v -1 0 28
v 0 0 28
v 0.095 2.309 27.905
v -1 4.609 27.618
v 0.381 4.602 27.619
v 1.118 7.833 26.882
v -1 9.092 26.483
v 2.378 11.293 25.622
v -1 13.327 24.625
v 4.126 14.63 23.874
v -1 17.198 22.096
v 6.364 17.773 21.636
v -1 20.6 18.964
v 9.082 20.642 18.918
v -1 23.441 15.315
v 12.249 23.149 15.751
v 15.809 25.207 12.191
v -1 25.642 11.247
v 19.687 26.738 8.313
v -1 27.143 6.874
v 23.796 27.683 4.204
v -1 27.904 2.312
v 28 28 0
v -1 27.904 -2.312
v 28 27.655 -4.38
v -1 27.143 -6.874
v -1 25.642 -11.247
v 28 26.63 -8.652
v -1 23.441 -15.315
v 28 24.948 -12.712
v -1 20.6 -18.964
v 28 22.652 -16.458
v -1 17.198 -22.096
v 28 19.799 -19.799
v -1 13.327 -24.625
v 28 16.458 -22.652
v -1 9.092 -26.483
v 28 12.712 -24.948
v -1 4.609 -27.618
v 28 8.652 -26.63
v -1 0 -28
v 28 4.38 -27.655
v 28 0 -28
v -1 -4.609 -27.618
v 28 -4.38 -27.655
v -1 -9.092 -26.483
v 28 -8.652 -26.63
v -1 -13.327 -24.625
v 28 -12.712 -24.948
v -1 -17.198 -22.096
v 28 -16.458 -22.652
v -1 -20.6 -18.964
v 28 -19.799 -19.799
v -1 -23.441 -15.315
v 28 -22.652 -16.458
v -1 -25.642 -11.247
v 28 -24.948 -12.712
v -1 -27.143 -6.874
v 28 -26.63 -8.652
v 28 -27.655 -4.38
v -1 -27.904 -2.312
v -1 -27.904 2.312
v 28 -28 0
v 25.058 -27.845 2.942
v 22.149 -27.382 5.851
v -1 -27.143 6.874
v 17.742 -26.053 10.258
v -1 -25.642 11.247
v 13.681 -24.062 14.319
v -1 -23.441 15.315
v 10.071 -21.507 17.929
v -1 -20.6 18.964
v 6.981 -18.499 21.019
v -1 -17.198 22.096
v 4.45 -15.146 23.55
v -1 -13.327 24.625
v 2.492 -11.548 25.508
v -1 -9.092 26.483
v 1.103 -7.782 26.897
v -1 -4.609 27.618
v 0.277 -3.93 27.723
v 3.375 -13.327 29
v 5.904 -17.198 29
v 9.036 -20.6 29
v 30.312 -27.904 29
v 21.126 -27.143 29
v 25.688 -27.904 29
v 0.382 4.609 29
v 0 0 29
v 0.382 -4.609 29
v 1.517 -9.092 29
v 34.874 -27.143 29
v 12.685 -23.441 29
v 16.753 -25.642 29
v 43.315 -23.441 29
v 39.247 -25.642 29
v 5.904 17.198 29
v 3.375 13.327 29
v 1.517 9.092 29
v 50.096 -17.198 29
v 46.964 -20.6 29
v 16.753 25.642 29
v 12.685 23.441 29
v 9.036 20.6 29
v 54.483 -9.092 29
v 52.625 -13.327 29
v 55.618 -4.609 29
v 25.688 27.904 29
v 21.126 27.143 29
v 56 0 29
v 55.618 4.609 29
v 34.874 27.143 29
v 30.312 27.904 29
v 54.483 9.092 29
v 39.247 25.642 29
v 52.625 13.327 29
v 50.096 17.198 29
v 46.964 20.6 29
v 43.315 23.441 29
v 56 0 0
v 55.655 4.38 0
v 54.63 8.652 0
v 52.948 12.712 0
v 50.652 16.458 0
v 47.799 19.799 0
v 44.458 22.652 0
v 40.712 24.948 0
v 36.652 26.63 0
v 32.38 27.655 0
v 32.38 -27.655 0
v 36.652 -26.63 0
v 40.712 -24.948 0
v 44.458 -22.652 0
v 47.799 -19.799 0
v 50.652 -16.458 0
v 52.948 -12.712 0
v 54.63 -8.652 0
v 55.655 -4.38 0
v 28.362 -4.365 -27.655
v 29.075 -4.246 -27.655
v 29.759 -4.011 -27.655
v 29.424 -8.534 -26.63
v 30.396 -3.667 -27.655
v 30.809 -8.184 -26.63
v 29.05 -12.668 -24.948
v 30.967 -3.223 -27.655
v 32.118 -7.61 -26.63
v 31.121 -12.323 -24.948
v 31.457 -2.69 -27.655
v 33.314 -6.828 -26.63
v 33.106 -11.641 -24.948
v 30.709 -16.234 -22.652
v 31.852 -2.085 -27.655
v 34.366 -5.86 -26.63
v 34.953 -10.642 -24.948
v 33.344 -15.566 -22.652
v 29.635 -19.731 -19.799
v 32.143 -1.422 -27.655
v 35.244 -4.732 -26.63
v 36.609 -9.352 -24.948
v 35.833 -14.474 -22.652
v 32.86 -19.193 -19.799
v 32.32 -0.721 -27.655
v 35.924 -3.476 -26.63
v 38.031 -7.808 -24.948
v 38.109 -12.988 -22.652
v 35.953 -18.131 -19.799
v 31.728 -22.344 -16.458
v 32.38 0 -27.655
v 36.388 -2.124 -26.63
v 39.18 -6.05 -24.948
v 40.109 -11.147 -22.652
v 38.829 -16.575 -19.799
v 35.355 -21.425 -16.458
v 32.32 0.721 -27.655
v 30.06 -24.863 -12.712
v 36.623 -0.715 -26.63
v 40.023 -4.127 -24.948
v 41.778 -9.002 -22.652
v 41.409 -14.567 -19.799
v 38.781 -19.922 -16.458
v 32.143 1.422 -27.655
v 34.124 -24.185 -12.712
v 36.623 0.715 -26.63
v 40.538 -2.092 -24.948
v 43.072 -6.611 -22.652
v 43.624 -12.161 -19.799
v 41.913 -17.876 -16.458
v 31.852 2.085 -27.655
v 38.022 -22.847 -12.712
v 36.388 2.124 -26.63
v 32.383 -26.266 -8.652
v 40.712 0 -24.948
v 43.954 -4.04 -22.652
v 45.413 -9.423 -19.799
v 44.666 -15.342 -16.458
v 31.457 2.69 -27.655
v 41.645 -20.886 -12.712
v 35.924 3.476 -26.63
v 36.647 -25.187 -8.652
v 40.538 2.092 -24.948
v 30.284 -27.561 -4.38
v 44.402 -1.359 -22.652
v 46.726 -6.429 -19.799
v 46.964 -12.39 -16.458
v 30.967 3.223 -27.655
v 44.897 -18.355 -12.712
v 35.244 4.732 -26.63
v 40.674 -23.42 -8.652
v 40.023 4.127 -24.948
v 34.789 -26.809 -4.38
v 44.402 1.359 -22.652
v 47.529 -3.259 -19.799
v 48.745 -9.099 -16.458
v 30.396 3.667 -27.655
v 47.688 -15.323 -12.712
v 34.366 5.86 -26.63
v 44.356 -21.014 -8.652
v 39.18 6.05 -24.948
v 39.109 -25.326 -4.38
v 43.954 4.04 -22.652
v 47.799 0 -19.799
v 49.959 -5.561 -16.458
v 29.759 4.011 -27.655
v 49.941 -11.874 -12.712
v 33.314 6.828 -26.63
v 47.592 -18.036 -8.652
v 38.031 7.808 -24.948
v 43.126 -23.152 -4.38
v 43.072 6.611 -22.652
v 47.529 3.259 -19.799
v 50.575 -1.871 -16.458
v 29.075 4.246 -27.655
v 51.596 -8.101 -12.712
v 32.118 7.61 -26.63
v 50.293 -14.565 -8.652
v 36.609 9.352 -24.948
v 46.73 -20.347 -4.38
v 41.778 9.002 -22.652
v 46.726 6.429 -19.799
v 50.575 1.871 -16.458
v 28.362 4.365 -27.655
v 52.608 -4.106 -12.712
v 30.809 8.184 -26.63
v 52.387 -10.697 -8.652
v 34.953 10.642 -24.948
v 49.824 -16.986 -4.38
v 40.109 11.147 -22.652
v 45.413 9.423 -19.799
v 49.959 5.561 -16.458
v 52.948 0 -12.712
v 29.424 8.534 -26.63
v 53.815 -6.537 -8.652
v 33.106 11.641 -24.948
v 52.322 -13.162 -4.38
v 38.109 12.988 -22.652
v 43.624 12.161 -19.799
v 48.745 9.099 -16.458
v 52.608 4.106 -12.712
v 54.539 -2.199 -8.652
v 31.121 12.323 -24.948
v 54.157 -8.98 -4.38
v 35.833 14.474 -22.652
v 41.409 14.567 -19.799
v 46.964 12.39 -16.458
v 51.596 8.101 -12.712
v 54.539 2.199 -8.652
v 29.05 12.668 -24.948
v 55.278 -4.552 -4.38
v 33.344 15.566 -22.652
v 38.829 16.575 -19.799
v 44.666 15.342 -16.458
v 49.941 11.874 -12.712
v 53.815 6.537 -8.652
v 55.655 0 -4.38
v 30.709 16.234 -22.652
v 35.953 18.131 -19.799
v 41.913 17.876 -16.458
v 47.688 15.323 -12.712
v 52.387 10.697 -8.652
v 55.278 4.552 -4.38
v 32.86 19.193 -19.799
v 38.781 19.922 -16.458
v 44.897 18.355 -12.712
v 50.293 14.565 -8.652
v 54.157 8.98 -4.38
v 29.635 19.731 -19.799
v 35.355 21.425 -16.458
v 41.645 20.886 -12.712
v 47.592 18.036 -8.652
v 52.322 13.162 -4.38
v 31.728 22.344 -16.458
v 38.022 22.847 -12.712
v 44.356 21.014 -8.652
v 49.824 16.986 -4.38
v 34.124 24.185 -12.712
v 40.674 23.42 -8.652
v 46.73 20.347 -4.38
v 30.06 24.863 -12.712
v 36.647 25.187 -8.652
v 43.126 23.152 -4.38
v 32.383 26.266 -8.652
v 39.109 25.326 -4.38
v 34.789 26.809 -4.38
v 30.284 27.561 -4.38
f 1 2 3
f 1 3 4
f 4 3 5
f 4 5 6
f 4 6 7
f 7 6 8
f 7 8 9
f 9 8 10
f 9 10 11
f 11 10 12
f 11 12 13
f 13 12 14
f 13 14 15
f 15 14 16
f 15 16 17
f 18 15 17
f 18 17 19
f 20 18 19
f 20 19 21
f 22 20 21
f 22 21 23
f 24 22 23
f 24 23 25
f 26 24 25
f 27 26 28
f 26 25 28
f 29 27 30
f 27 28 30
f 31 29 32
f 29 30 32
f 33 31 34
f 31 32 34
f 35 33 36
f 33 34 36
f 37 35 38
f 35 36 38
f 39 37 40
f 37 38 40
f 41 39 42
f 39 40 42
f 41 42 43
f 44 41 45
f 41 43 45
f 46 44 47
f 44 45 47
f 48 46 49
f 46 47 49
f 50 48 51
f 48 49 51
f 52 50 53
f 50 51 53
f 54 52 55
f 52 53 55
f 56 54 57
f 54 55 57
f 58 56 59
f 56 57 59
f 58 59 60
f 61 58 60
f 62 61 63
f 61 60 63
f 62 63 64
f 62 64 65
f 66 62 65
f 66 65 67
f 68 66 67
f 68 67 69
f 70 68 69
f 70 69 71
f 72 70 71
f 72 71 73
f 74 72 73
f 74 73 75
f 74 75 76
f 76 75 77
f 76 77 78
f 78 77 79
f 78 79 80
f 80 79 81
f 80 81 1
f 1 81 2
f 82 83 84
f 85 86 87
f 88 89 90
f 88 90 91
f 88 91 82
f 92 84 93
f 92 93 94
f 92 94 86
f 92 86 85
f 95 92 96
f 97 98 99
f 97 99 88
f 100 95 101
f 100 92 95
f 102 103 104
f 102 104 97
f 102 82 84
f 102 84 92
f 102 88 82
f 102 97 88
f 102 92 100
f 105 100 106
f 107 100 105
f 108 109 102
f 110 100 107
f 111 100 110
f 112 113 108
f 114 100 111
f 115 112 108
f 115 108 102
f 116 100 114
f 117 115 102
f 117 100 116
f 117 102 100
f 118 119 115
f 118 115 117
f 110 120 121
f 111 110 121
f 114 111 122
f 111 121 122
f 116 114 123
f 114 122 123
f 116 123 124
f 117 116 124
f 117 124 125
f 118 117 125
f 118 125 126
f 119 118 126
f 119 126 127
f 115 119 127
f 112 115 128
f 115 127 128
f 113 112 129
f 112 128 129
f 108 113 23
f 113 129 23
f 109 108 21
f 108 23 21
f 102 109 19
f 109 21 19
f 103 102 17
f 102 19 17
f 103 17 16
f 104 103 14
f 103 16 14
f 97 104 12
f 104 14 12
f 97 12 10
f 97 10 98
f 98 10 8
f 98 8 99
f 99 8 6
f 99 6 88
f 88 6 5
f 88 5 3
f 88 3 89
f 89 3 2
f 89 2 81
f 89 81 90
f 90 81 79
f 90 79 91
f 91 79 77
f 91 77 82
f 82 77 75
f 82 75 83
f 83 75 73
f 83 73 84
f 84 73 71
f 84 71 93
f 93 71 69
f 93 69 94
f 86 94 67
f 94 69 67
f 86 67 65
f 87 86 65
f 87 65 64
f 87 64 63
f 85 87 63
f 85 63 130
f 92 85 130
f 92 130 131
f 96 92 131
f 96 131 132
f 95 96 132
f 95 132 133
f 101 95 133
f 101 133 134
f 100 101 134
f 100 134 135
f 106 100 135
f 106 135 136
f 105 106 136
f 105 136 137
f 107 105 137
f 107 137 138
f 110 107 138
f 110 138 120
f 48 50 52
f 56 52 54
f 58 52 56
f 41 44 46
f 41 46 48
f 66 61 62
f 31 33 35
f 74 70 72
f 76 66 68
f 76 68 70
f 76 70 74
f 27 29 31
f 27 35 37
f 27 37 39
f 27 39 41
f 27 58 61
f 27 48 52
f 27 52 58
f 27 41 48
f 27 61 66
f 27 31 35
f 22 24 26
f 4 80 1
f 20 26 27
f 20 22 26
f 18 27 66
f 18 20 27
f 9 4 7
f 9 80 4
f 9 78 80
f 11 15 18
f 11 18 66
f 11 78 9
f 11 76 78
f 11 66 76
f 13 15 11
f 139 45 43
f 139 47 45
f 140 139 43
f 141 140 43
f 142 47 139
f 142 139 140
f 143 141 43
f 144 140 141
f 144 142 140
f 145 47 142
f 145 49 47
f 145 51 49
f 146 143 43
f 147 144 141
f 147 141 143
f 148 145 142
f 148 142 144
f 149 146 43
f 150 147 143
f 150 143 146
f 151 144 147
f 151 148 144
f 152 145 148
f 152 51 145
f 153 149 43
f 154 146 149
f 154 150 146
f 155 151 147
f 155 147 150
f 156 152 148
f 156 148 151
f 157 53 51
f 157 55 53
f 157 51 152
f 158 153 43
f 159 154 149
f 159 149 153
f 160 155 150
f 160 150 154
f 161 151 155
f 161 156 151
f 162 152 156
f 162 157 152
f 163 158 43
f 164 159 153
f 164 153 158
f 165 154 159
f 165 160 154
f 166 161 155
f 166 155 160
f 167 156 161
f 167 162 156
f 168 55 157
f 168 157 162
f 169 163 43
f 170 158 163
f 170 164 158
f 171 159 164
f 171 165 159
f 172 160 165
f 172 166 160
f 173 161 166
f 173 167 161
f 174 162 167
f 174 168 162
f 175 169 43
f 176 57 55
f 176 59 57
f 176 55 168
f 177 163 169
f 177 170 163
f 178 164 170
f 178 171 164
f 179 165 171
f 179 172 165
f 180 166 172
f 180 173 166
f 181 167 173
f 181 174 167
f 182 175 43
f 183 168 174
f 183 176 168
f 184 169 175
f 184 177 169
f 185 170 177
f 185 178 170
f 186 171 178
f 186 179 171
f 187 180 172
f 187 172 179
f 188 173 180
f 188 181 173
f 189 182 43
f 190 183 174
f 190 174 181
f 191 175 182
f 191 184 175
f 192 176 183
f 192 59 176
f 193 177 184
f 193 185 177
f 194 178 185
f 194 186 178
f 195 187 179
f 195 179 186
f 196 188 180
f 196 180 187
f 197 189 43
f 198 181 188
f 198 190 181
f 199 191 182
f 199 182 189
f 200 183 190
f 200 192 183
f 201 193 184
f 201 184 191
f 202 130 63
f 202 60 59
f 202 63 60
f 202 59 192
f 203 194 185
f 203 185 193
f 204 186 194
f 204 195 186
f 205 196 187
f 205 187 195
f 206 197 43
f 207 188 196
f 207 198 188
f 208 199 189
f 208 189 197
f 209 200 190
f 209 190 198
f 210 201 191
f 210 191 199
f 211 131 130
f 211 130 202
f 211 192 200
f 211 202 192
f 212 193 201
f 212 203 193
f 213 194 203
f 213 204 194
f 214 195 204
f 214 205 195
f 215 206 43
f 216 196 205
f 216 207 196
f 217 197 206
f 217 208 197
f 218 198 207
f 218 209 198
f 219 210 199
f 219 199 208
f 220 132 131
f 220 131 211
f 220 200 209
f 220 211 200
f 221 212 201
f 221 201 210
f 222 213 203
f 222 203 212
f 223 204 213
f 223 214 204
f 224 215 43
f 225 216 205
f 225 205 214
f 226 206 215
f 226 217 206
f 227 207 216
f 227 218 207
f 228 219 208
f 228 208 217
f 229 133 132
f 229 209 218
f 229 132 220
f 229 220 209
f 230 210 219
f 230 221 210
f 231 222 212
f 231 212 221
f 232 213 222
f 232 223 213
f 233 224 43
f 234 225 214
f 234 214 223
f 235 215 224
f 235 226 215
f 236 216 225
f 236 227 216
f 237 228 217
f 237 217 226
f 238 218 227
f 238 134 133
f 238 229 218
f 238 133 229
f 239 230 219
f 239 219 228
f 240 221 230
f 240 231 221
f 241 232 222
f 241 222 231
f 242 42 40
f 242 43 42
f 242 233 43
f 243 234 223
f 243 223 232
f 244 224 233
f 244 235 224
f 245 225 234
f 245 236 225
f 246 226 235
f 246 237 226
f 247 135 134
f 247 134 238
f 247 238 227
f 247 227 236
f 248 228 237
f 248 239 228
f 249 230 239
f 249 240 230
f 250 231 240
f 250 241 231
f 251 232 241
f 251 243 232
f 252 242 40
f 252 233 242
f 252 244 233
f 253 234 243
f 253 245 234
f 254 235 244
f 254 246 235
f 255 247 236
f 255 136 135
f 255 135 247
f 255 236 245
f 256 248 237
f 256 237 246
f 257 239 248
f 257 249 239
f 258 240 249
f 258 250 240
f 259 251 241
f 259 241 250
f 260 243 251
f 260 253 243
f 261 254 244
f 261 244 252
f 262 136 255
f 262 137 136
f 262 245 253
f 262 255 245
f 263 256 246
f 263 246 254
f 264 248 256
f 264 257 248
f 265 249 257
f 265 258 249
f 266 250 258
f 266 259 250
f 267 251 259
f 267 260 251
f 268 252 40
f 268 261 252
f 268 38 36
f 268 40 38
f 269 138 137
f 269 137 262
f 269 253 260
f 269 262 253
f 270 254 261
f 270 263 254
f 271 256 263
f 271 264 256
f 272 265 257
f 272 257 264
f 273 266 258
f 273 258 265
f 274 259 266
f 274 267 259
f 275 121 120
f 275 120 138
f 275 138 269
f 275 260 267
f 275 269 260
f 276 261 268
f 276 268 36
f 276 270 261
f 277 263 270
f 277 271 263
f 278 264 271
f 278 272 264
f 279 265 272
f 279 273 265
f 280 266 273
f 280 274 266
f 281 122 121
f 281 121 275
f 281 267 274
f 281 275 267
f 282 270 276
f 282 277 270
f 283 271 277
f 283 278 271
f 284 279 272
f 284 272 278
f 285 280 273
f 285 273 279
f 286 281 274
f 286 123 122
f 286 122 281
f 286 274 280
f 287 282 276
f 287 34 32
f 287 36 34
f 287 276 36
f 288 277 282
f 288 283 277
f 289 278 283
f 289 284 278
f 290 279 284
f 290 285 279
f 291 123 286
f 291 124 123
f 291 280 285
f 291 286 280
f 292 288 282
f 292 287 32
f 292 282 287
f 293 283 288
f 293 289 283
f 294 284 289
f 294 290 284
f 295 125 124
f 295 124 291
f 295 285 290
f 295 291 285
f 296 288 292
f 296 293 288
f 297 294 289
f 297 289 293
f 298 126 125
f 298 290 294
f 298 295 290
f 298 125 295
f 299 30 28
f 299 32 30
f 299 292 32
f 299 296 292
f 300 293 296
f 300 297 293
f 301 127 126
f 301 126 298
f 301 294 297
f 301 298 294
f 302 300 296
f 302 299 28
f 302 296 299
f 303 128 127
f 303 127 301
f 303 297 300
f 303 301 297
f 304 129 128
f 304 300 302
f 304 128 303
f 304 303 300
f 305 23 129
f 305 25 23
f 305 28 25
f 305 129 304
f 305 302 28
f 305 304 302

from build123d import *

# Parameters (mm, degrees)
CYLINDER_R        = 28
CYLINDER_DEPTH    = 29
CYLINDER001_R     = 28
CYLINDER001_DEPTH = 29


with BuildPart() as cylinder:
    # Cylinder → Cylinder (new body)
    with BuildSketch(Plane(origin=(28, 0, 0), x_dir=(1, 0, 0), z_dir=(0, 0, 1))):
        Circle(CYLINDER_R)
    extrude(amount=CYLINDER_DEPTH)


with BuildPart() as sphere:
    # Sphere → Sphere (revolve)
    with BuildSketch(Plane(origin=(28, 0, 0), x_dir=(1, 0, 0), z_dir=(0, -1, 0))):
        with BuildLine():
            ThreePointArc((0, -28), (28, 0), (0, 28))
            Line((0, 28), (0, -28))
        make_face()
    revolve(axis=Axis((28, 0, 0), (0, 0, 1)))


with BuildPart() as fusion:
    # Cylinder001 → Cylinder001 (new body)
    with BuildSketch(Plane.ZY.offset(-28)):
        Circle(CYLINDER001_R)
    extrude(amount=CYLINDER001_DEPTH)

    # Fusion: union Cylinder, Sphere
    add(cylinder.part)
    add(sphere.part)


solid = fusion.part
